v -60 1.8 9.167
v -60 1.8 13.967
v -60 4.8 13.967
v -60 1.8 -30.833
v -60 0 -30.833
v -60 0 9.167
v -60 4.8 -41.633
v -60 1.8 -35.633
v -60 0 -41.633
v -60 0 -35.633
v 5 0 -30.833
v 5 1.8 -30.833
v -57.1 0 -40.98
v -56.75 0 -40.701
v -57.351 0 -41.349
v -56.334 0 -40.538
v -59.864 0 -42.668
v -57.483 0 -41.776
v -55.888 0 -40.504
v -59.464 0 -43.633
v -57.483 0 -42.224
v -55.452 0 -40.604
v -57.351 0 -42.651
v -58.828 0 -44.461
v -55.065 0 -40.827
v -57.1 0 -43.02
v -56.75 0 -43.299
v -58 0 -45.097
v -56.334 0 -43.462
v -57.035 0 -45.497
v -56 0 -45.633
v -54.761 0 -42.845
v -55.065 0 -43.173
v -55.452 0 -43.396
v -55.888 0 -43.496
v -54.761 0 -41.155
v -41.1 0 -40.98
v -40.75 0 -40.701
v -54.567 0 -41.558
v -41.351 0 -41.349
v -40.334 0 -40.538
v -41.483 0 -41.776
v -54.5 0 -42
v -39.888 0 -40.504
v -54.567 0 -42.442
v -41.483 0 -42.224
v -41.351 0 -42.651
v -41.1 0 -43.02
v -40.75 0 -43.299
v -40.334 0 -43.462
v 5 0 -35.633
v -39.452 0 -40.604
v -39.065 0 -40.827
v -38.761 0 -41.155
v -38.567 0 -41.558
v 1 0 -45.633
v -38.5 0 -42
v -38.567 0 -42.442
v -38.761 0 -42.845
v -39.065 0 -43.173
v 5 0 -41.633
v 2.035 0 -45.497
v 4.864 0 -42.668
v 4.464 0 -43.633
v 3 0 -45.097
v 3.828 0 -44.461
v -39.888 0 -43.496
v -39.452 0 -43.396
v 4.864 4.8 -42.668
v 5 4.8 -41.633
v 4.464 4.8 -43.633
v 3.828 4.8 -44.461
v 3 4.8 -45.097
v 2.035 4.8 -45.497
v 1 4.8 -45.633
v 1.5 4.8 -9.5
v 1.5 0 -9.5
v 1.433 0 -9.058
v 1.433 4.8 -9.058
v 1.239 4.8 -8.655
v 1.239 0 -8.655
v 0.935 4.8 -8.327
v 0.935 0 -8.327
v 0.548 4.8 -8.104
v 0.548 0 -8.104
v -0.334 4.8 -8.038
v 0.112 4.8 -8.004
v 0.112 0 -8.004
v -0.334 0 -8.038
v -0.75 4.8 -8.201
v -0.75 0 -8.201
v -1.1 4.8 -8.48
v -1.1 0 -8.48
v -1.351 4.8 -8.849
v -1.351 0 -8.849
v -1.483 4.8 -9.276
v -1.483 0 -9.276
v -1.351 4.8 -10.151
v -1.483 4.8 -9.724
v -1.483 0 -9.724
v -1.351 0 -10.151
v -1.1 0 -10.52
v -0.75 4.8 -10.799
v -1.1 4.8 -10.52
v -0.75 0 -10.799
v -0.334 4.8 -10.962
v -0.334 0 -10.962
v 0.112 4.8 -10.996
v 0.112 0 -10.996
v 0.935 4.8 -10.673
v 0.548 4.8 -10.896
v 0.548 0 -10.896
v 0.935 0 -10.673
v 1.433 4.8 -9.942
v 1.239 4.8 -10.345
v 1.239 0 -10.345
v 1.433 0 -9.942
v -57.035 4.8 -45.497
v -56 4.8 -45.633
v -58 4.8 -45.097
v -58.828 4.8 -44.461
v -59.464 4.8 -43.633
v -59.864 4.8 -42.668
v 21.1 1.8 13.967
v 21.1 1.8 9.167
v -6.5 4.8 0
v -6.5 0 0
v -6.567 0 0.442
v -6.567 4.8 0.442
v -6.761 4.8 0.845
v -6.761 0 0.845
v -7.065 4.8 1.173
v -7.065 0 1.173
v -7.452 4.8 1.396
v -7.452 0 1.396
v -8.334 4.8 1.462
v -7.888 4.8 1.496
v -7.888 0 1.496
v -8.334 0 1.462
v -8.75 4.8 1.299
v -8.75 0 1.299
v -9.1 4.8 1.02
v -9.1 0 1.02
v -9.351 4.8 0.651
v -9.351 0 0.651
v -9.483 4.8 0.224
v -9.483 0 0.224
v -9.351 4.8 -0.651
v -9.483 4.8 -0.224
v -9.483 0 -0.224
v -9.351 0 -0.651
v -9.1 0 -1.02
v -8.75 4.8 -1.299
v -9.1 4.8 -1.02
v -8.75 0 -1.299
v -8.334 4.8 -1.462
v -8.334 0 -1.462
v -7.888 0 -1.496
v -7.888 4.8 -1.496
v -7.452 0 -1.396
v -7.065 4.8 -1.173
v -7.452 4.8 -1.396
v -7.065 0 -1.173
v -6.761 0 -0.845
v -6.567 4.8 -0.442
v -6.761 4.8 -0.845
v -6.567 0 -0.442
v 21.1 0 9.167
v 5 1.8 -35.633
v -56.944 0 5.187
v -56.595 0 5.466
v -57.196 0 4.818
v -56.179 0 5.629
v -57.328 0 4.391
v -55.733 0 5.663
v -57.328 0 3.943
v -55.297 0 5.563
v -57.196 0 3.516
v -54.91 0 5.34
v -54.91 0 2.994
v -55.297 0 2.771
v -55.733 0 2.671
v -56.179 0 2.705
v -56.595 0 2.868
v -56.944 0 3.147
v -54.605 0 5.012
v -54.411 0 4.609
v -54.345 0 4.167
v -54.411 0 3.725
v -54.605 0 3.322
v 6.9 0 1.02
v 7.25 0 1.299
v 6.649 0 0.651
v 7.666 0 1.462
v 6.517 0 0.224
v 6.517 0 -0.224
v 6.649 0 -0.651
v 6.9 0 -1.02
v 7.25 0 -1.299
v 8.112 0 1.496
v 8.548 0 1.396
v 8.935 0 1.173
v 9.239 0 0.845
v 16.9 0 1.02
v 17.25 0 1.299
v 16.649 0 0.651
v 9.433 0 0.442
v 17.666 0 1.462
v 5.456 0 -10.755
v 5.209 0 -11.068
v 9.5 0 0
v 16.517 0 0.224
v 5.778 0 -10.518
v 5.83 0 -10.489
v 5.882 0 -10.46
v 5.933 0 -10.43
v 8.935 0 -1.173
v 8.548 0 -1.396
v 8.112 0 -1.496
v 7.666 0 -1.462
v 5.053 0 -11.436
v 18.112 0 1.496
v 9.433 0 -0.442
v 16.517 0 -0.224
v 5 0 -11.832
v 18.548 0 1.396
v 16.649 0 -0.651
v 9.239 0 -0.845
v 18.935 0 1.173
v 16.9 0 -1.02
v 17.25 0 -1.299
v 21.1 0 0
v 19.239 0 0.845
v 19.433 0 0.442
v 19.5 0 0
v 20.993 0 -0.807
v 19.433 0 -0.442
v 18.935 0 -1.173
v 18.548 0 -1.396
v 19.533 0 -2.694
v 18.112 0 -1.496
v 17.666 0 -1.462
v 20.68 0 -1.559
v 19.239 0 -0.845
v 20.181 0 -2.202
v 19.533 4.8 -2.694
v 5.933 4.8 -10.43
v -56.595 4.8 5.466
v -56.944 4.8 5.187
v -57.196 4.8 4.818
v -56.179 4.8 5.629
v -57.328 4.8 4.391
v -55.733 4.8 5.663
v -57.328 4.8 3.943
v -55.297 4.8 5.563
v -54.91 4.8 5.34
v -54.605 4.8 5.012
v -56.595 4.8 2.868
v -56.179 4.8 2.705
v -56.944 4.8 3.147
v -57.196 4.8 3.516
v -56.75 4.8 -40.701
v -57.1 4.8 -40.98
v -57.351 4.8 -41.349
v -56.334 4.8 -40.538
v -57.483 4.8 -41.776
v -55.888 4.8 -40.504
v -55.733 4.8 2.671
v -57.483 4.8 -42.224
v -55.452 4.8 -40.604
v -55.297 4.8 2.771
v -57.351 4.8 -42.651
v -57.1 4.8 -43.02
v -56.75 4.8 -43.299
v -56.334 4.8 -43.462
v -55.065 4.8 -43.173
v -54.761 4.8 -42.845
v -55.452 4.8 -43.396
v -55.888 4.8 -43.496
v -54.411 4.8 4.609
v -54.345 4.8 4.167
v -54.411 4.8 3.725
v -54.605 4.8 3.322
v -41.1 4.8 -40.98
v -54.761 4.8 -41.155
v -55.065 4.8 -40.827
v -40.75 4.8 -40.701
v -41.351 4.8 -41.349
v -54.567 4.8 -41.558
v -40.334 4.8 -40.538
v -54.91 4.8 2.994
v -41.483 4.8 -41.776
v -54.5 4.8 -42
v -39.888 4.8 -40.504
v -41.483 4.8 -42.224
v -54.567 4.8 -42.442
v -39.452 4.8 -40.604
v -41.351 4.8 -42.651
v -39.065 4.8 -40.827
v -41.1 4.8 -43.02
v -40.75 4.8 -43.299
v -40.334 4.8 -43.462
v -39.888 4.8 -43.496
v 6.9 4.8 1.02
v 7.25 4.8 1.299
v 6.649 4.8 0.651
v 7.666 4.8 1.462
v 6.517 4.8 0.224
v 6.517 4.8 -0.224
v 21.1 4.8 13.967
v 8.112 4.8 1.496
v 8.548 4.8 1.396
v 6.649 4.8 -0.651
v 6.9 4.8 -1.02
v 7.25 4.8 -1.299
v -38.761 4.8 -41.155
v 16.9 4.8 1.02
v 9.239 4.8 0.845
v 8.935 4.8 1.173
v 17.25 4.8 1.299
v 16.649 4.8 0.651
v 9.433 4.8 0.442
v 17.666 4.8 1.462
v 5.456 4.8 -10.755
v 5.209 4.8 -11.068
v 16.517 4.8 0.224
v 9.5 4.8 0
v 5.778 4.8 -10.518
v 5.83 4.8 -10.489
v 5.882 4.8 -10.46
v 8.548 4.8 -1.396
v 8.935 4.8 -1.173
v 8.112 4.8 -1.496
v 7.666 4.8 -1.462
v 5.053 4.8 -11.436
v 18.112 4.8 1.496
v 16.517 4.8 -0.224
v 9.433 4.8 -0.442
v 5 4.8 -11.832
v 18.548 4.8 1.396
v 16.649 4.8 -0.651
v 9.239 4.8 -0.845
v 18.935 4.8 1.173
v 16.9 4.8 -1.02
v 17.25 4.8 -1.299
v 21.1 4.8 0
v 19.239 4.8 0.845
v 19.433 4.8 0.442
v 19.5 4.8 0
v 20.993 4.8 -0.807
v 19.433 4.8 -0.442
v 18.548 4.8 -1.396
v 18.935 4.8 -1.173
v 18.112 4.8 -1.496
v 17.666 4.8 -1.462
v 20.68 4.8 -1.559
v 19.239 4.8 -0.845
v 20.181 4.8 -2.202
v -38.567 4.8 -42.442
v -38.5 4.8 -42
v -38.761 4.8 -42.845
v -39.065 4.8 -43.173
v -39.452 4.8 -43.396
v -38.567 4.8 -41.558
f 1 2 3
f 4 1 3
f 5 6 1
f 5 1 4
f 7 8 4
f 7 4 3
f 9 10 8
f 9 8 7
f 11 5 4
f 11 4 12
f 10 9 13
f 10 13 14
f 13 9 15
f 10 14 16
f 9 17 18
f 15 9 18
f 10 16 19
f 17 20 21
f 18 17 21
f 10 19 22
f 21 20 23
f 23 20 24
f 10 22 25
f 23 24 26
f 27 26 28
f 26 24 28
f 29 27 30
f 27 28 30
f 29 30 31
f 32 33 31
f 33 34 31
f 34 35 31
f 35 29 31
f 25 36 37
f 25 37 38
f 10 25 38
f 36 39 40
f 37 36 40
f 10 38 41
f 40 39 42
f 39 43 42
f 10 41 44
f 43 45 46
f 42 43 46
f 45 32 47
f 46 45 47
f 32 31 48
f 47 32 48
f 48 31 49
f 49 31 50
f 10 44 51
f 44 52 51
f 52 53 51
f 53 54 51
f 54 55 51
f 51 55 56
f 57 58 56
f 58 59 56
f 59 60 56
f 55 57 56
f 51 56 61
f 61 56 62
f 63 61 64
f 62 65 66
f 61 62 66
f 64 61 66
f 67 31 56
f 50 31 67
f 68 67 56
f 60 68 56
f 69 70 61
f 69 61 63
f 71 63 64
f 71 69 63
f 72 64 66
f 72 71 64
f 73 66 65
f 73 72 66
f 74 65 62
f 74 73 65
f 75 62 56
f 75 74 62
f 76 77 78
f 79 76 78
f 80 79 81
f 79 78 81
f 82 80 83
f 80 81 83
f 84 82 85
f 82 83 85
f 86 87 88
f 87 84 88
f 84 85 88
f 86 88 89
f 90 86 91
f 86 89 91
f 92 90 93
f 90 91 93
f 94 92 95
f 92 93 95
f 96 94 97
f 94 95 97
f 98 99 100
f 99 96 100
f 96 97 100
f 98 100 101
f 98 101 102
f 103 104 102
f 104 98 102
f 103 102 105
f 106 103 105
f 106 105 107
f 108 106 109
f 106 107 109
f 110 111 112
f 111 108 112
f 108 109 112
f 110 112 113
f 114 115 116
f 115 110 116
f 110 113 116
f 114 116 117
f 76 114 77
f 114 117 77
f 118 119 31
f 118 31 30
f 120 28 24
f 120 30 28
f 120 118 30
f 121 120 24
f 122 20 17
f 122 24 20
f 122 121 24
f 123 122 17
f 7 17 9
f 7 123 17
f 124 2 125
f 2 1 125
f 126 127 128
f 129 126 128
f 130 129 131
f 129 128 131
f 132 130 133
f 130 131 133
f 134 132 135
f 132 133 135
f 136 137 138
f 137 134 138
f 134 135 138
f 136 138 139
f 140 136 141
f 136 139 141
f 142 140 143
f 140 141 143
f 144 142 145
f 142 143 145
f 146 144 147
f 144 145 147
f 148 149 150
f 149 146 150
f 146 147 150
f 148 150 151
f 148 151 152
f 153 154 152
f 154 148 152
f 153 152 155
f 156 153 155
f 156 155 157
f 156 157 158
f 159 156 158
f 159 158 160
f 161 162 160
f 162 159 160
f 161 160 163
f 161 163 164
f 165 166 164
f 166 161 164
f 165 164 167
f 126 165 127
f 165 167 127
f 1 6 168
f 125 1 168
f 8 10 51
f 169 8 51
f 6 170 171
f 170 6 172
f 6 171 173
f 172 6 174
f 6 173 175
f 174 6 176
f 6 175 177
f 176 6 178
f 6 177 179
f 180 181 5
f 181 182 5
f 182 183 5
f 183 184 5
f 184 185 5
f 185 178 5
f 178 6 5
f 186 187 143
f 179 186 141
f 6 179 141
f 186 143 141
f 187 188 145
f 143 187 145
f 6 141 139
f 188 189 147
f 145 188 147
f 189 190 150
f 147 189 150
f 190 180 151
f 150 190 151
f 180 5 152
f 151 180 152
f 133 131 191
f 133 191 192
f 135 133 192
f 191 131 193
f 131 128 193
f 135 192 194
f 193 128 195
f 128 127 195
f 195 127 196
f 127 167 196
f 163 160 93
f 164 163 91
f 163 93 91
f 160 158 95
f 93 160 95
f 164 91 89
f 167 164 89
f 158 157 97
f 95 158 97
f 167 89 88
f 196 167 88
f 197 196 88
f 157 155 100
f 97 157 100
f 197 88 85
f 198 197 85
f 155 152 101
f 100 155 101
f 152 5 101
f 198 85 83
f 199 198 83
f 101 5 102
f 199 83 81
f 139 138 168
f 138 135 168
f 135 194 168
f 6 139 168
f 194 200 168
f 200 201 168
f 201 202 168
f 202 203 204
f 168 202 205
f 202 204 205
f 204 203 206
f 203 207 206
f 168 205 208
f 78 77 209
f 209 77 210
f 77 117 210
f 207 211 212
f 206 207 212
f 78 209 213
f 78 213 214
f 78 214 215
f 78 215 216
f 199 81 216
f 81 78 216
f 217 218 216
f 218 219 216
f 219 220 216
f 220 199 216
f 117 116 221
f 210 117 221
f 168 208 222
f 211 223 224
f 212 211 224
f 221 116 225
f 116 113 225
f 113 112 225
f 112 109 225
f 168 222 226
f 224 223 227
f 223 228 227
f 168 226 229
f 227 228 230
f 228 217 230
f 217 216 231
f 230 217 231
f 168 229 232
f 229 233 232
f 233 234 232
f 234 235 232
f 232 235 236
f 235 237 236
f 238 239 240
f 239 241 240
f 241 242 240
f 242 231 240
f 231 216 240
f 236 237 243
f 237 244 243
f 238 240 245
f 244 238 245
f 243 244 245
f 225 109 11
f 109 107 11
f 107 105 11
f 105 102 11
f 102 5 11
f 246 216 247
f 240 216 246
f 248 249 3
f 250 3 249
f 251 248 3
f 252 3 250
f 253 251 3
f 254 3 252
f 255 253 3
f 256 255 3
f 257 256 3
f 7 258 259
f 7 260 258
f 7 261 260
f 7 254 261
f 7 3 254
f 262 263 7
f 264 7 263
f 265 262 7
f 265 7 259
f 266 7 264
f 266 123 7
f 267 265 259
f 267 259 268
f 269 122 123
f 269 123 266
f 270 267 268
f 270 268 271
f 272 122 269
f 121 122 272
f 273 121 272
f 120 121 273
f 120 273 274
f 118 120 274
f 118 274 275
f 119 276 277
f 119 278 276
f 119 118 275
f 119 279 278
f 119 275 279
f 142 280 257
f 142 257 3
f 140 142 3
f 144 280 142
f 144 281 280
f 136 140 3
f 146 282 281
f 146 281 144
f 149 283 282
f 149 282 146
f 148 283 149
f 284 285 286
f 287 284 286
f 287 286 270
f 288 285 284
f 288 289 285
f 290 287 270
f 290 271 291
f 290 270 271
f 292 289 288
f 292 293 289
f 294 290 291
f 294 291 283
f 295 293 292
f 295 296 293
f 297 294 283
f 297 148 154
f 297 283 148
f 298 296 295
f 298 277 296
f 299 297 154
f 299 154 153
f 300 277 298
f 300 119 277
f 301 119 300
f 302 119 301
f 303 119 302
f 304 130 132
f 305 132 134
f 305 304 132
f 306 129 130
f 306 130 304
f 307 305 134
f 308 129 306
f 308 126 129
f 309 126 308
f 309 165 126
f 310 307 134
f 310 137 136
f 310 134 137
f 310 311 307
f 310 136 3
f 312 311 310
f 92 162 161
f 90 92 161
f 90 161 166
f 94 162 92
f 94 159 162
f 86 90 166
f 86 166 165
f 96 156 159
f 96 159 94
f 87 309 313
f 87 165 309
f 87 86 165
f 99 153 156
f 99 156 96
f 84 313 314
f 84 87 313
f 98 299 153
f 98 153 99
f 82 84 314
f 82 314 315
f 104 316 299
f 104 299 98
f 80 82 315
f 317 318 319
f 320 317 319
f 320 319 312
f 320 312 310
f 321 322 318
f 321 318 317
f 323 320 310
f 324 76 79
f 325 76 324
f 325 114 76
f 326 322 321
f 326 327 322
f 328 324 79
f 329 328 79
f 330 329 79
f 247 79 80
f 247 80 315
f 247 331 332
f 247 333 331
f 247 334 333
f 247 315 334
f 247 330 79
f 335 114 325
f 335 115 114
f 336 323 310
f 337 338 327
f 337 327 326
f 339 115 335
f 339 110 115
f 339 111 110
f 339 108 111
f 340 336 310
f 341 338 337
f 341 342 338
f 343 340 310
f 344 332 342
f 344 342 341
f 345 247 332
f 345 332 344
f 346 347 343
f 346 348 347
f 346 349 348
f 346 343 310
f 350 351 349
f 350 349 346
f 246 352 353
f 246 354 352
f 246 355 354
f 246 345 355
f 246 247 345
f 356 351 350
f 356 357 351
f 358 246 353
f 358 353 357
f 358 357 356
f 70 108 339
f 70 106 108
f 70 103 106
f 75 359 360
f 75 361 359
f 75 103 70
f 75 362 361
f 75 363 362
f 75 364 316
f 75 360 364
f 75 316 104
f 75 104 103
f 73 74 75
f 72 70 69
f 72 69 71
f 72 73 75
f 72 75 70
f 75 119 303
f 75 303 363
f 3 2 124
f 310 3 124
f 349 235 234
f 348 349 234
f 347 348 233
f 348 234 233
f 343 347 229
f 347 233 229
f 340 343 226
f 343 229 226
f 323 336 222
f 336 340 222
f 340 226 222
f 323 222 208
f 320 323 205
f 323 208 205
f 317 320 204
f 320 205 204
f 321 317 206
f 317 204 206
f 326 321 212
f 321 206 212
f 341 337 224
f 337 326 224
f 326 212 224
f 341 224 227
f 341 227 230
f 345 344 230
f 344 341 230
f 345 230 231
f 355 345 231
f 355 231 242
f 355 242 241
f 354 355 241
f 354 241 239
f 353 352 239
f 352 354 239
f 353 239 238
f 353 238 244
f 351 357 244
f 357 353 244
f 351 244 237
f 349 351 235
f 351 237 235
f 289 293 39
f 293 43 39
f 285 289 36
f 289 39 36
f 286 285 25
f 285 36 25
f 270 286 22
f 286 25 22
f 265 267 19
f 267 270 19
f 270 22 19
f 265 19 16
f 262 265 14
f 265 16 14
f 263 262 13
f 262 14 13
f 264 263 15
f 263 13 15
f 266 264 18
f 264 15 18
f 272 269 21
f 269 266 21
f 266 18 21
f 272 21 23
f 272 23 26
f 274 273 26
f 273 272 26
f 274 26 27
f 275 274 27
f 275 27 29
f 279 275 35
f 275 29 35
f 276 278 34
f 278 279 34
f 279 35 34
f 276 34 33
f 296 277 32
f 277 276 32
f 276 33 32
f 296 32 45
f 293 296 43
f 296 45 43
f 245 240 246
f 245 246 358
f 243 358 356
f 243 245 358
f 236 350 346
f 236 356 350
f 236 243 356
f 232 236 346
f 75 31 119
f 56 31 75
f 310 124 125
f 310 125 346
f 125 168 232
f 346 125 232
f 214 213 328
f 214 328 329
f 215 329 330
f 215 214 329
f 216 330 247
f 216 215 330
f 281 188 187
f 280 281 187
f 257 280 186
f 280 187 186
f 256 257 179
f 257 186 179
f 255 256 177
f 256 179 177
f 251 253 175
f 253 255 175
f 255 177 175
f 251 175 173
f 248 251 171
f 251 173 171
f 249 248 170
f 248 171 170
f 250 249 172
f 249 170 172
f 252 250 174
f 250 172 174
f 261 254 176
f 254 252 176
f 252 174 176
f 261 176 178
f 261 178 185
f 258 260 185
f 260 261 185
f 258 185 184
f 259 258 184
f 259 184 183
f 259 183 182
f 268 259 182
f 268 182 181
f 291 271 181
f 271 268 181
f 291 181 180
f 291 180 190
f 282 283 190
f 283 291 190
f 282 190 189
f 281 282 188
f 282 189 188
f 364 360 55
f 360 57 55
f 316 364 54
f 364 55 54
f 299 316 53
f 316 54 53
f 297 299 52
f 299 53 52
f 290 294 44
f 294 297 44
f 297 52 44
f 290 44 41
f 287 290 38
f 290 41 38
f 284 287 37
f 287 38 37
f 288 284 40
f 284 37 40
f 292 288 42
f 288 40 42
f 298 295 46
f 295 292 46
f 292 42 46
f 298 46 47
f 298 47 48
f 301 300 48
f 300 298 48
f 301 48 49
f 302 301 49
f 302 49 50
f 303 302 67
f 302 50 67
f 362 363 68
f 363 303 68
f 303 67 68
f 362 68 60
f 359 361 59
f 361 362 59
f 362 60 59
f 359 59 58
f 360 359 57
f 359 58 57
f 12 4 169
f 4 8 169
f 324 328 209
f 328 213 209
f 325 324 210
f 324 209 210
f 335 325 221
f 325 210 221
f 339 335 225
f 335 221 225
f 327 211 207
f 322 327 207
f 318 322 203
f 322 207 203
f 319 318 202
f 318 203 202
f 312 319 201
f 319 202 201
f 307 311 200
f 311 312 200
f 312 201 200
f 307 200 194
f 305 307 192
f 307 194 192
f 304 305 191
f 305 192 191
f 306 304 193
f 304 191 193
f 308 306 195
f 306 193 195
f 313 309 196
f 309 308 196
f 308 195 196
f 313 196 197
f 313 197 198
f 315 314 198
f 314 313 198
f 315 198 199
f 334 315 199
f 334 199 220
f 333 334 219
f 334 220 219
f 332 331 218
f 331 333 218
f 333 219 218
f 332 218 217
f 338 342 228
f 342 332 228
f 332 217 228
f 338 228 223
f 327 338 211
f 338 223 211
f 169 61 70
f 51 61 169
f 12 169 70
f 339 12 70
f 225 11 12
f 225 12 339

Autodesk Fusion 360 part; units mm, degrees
sketch "Sketch1" plane through (0, 0, 0) normal (0, 1, 0) x (1, 0, 0)
  circle A0 centre (0, 0) radius 48 construction
  circle A1 centre (0, 0) radius 14 construction
  circle A2 centre (0, 0) radius 9.5 construction
  circle A3 centre (0, 0) radius 8 construction
  line L0 (0, 0) -> (8, 0) construction
  line L1 (0, 0) -> (0, -9.5) construction
  line L2 (0, 0) -> (-8, 0) construction
  line L3 (0, 0) -> (0, 9.5) construction
  circle A4 centre (8, 0) radius 1.5
  circle A5 centre (-8, 0) radius 1.5
  circle A6 centre (0, 9.5) radius 1.5
  circle A7 centre (0, 0) radius 12 construction
  line L4 (8, 0) -> (18, 0) construction
  line L5 (21.1, 0) -> (19.55, 2.6847) construction
  line L6 (19.55, 2.6847) -> (16.45, 2.6847) construction
  line L7 (16.45, 2.6847) -> (14.9, 0) construction
  line L8 (14.9, 0) -> (16.45, -2.6847) construction
  line L9 (16.45, -2.6847) -> (19.55, -2.6847) construction
  line L10 (19.55, -2.6847) -> (21.1, 0) construction
  circle A8 centre (18, 0) radius 3.1 construction
  circle A9 centre (18, 0) radius 1.5
  line L11 (0, 52) -> (-68, 52) construction
  line L12 (-9.7468, 47) -> (-68, 47) construction
  line L13 (-68, 52) -> (-68, 47) construction
  line L14 (-68, 47) -> (-68, 35.633) construction
  line L15 (-68, 35.633) -> (-32.1604, 35.633) construction
  line L16 (-68, 35.633) -> (-68, 30.833) construction
  line L17 (-68, 30.833) -> (-36.7876, 30.833) construction
  line L18 (-68, 30.833) -> (-68, -9.167) construction
  line L19 (-60, -9.167) -> (-47.1165, -9.167)
  line L20 (-68, -9.167) -> (-68, -13.967) construction
  line L21 (-68, -13.967) -> (-45.923, -13.967) construction
  line L22 (-60, -13.967) -> (-60, 35.633)
  line L23 (5.9333, 10.4305) -> (19.5328, 2.6945)
  line L24 (-60, -13.967) -> (21.1, -13.967)
  line L25 (21.1, -13.967) -> (21.1, 0)
  arc A10 (21.1, 0) -> (19.5328, 2.6945) centre (18, 0) ccw
  line L26 (-60, 35.633) -> (5, 35.633)
  line L27 (5, 35.633) -> (5, 11.8322)
  arc A11 (5.9333, 10.4305) -> (5.7778, 10.5175) centre (0, 0) ccw
  arc A12 (5, 11.8322) -> (5.7778, 10.5175) centre (6.5, 11.8322) ccw
  arc A13 (5.7778, 10.5175) -> (7.9656, 11.513) centre (6.5, 11.8322) ccw construction
  arc A14 (5.4445, 12.898) -> (5, 11.8322) centre (6.5, 11.8322) ccw construction
  arc A15 (7.9656, 11.513) -> (5.4445, 12.898) centre (6.5, 11.8322) ccw construction
  line L28 (5, 11.8322) -> (5, 10.9087) construction
  arc A16 (5.7778, 10.5175) -> (5, 10.9087) centre (0, 0) ccw construction
  line L29 (-60, 30.833) -> (5, 30.833)
  line L30 (-47.1165, -9.167) -> (21.1, -9.167)
  line L31 (-60, 35.633) -> (-60, 45.633)
  line L32 (-60, 45.633) -> (5, 45.633)
  line L33 (5, 45.633) -> (5, 35.633)
  circle A17 centre (-56, 42) radius 1.5
  circle A18 centre (-40, 42) radius 1.5
  line L34 (-40, 42) -> (0, 0) construction
  circle A19 centre (-55.8448, -4.167) radius 1.5
  line L35 (0, 0) -> (-55.8448, -4.167) construction
  line L36 (-68, -9.167) -> (-60, -9.167) construction
  point P0 (18, 0)
  point P1 (-33.1034, 34.7586)
  point P2 (-47.8669, -3.5717)
  dimension "d1" = 96
  dimension "d2" = 28
  dimension "d3" = 19
  dimension "d4" = 16
  dimension "d5" = 3
  dimension "d6" = 3
  dimension "d7" = 3
  dimension "d8" = 24
  dimension "d9" = 18
  dimension "d10" = 3.1
  dimension "d11" = 60
  dimension "d12" = 3
  dimension "d13" = 52
  dimension "d14" = 68
  dimension "d15" = 68
  dimension "d18" = 5
  dimension "d22" = 16.367
  dimension "d23" = 4.8
  dimension "d24" = 40
  dimension "d25" = 4.8
  dimension "d26" = 8
  dimension "d27" = 3.1
  dimension "d28" = 5
  dimension "d33" = 12
  dimension "d34" = 3
  dimension "d35" = 10
  dimension "d36" = 3
  dimension "d37" = 12
  dimension "d38" = 5
  dimension "d39" = 3
  dimension "d40" = 5
  dimension "d41" = 10
  dimension "d42" = 3
  dimension "d43" = 5
  dimension "d44" = 8
extrude "Extrude1" add sketch "Sketch1" along normal blind 4.8
fillet "Fillet1" radius 4 2 edges at (5, 2.4, -45.633) (-60, 2.4, -45.633)
extrude "Extrude2" cut sketch "Sketch1" along normal blind 1.8 contours L19 L22 L24 L25 L30 | L22 L26 L27 L29
